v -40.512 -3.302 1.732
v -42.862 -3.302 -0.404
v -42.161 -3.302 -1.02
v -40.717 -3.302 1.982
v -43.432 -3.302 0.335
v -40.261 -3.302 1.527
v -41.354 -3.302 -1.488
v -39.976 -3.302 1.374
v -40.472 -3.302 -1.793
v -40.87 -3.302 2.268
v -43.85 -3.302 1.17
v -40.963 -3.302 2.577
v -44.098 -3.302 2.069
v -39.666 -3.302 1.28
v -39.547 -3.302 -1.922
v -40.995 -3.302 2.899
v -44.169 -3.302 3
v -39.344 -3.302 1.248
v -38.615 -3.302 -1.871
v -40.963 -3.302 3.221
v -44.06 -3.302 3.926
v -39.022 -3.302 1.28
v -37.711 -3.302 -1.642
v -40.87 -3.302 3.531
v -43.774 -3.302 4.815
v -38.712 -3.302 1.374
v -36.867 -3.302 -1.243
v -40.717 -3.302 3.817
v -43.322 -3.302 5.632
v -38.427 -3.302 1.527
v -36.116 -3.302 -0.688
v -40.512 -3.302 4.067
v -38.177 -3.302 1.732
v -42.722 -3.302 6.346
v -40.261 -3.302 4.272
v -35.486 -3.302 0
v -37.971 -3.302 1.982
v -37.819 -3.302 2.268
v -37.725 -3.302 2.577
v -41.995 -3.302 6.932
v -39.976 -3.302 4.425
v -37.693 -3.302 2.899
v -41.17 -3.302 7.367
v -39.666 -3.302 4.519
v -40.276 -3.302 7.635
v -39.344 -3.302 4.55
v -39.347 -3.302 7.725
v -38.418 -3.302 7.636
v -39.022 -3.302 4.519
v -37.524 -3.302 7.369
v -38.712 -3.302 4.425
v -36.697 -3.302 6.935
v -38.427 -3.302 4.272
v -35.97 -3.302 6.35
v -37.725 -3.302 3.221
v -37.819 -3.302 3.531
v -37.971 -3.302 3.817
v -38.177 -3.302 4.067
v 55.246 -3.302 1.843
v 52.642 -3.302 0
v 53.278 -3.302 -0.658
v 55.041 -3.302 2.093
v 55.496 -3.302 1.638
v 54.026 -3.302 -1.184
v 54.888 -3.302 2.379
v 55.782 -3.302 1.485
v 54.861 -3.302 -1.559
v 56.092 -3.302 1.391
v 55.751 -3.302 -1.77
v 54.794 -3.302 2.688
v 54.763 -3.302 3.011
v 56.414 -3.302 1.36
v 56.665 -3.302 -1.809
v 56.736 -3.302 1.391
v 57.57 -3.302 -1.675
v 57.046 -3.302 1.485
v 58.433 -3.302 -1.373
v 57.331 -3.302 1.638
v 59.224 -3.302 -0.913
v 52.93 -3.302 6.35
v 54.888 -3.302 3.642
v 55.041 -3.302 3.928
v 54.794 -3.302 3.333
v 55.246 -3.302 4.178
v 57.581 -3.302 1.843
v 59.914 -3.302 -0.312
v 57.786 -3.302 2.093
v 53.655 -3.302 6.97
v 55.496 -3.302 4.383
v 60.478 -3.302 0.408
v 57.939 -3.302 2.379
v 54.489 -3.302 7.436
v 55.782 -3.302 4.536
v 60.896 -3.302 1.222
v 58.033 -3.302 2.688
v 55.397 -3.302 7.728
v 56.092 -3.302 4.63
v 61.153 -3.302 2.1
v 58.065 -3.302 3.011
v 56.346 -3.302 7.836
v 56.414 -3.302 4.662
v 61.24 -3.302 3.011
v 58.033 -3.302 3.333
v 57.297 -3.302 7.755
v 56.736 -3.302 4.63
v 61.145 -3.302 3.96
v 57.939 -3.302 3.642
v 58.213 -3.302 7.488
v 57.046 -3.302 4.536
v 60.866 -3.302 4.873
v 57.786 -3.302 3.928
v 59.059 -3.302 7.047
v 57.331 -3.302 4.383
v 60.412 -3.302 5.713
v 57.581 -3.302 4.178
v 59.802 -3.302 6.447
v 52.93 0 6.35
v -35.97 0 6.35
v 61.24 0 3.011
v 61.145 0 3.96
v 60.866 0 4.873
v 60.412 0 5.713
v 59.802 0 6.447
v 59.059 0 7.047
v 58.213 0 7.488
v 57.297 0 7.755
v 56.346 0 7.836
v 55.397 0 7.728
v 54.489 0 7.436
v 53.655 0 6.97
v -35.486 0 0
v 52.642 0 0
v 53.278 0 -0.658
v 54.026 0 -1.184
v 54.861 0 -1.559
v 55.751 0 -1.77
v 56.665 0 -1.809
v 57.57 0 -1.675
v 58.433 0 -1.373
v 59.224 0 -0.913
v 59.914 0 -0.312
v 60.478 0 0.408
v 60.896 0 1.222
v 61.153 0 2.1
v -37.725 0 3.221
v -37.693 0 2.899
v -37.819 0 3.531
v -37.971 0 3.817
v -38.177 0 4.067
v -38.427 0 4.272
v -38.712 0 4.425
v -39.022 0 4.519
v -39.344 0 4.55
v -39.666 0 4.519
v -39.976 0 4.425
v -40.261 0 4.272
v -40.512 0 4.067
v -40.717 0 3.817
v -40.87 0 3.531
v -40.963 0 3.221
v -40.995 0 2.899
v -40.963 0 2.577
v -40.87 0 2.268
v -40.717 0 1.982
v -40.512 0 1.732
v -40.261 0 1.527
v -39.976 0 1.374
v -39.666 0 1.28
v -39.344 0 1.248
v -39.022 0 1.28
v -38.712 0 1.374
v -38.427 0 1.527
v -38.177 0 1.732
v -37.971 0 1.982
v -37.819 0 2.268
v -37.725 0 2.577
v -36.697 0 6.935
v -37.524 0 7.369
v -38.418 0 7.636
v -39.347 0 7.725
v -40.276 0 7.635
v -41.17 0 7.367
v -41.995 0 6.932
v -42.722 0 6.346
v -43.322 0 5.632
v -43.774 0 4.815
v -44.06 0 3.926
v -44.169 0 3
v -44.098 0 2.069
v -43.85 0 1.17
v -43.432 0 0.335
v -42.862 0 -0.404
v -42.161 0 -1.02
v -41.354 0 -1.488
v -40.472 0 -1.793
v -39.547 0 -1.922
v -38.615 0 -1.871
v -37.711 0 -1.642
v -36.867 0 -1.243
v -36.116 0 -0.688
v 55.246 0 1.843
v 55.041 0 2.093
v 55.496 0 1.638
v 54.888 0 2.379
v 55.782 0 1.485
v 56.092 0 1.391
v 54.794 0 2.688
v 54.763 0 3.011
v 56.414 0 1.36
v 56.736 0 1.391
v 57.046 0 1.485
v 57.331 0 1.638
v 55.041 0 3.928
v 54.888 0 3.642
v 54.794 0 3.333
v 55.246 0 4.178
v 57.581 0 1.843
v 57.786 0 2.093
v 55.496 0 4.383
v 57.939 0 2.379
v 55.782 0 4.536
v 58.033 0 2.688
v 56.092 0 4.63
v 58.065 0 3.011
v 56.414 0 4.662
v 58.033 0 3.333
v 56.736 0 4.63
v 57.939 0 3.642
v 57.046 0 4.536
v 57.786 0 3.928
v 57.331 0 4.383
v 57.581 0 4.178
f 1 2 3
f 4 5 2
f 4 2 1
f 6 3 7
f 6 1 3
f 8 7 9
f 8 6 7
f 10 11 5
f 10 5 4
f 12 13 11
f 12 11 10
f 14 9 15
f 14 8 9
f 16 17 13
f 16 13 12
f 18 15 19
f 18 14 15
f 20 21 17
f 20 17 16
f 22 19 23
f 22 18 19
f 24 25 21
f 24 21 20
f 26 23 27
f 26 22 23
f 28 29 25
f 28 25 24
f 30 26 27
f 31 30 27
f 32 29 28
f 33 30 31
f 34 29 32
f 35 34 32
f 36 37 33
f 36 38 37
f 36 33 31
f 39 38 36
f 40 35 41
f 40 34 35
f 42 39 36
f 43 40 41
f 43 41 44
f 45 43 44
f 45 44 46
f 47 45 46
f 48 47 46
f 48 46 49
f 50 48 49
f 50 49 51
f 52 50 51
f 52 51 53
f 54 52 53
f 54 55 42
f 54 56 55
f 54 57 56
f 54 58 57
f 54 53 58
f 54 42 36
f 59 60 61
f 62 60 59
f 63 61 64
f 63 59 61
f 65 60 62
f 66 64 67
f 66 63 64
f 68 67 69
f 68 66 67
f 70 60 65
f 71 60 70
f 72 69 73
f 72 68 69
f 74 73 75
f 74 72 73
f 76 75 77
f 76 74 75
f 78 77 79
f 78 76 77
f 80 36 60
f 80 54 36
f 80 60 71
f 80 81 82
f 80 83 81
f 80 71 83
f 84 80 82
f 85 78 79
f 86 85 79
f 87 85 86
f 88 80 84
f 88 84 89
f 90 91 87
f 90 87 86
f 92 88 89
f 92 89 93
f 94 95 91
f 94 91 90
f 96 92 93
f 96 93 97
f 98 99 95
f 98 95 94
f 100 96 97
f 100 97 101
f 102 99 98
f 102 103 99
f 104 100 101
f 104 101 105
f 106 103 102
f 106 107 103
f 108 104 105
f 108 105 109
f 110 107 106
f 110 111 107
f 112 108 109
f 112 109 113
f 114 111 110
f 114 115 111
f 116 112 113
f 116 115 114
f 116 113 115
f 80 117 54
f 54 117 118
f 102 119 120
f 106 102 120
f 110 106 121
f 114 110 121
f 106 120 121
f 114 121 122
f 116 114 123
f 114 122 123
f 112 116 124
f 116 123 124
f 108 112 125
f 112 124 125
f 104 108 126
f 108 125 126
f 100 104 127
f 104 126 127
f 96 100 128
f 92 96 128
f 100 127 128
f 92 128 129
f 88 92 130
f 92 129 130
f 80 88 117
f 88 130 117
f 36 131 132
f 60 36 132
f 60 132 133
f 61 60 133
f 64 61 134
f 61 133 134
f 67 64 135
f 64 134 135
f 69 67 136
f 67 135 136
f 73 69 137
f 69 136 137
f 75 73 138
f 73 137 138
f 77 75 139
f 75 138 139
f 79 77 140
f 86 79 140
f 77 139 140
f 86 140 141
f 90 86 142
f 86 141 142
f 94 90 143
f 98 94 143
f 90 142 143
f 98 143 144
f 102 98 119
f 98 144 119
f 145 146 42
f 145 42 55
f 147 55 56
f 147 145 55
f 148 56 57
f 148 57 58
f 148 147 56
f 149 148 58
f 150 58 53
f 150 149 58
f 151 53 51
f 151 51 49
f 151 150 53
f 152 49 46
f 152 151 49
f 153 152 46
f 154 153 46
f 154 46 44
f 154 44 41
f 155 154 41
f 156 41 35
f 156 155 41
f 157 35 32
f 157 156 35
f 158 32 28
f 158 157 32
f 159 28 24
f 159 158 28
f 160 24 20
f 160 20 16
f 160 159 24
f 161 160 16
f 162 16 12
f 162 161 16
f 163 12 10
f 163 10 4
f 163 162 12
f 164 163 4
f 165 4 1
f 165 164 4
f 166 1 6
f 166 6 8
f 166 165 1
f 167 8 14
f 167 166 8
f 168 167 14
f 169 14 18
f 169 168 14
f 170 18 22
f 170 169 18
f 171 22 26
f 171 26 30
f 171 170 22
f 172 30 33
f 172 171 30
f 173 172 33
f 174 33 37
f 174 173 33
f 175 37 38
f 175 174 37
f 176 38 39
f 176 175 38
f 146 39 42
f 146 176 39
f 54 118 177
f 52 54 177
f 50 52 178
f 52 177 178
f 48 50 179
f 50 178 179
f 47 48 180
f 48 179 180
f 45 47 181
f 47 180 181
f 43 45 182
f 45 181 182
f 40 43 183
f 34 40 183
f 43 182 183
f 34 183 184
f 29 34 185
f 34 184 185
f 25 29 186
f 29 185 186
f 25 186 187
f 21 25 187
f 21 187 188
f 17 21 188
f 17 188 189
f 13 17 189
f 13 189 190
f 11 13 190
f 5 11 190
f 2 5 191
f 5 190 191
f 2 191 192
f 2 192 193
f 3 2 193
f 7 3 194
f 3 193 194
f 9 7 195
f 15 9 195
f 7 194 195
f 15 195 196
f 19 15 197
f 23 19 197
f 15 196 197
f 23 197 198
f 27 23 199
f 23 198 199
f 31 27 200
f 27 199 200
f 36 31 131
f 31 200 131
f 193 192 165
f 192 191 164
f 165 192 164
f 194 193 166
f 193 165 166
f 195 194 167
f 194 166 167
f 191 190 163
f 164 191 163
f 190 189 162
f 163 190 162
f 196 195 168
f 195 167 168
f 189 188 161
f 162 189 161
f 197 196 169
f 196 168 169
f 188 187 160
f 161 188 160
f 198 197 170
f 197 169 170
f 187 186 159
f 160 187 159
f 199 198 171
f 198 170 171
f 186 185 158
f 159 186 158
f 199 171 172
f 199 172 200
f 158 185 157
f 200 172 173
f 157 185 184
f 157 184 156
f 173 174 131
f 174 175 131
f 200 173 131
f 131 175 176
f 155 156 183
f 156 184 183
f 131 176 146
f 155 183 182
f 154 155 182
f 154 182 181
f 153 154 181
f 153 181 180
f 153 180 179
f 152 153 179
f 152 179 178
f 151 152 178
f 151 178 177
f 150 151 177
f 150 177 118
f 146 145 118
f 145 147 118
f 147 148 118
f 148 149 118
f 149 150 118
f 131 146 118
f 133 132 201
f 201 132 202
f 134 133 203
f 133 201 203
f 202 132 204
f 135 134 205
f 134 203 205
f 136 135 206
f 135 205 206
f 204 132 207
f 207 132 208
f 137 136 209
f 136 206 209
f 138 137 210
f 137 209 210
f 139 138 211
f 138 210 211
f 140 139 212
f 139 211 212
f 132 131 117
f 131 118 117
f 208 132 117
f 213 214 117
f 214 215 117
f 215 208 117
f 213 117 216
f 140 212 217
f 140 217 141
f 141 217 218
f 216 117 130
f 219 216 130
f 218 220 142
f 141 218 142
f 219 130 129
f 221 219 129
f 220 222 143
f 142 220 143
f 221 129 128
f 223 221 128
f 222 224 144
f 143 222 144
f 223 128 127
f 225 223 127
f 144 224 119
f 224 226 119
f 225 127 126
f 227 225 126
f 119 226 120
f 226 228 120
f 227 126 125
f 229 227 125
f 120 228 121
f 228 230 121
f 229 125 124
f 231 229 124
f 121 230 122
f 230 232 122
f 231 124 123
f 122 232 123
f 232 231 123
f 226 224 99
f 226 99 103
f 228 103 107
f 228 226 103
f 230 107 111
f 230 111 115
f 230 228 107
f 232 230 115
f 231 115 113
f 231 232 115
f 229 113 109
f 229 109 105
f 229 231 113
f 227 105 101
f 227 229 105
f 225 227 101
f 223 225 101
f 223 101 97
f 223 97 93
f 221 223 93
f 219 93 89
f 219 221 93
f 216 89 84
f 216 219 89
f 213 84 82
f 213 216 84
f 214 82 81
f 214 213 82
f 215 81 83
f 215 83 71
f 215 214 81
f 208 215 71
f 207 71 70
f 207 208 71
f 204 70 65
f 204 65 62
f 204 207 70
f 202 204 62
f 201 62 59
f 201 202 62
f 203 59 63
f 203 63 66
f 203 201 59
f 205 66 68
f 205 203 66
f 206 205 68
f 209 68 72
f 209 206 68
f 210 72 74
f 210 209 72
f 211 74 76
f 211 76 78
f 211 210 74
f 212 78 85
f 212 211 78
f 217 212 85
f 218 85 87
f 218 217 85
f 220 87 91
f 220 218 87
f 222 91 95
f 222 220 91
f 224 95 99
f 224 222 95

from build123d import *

# Parameters (mm, degrees)
F0_R     = 1.651
F1_DEPTH = 3.302


with BuildPart() as f1:
    # F0 (on Front) → F1 (new body)
    with BuildSketch(Plane.XZ):
        with BuildLine():
            Line((52.929746, 6.35), (-35.970254, 6.35))
            ThreePointArc((-35.970254, 6.35), (-34.896008, 4.771231), (-34.518209, 2.899391))
            ThreePointArc((-34.518209, 2.899391), (-34.766614, 1.371027), (-35.486256, 0))
            Line((-35.486256, 0), (52.641847, 0))
            ThreePointArc((52.641847, 0), (51.592679, 3.229094), (52.929746, 6.35))
        make_face()
        with BuildLine():
            ThreePointArc((-34.518209, 2.899391), (-34.896008, 4.771231), (-35.970254, 6.35))
            ThreePointArc((-35.970254, 6.35), (-44.156252, 2.532616), (-35.486256, 0))
            ThreePointArc((-35.486256, 0), (-34.766614, 1.371027), (-34.518209, 2.899391))
        make_face()
        with Locations((-39.344209, 2.899391)):
            Circle(F0_R, mode=Mode.SUBTRACT)
        with BuildLine():
            ThreePointArc((61.239726, 3.010515), (58.213252, 7.488459), (52.929746, 6.35))
            ThreePointArc((52.929746, 6.35), (51.592679, 3.229094), (52.641847, 0))
            ThreePointArc((52.641847, 0), (58.008591, -1.544337), (61.239726, 3.010515))
        make_face()
        with Locations((56.413726, 3.010515)):
            Circle(F0_R, mode=Mode.SUBTRACT)
    extrude(amount=F1_DEPTH)


solid = f1.part
